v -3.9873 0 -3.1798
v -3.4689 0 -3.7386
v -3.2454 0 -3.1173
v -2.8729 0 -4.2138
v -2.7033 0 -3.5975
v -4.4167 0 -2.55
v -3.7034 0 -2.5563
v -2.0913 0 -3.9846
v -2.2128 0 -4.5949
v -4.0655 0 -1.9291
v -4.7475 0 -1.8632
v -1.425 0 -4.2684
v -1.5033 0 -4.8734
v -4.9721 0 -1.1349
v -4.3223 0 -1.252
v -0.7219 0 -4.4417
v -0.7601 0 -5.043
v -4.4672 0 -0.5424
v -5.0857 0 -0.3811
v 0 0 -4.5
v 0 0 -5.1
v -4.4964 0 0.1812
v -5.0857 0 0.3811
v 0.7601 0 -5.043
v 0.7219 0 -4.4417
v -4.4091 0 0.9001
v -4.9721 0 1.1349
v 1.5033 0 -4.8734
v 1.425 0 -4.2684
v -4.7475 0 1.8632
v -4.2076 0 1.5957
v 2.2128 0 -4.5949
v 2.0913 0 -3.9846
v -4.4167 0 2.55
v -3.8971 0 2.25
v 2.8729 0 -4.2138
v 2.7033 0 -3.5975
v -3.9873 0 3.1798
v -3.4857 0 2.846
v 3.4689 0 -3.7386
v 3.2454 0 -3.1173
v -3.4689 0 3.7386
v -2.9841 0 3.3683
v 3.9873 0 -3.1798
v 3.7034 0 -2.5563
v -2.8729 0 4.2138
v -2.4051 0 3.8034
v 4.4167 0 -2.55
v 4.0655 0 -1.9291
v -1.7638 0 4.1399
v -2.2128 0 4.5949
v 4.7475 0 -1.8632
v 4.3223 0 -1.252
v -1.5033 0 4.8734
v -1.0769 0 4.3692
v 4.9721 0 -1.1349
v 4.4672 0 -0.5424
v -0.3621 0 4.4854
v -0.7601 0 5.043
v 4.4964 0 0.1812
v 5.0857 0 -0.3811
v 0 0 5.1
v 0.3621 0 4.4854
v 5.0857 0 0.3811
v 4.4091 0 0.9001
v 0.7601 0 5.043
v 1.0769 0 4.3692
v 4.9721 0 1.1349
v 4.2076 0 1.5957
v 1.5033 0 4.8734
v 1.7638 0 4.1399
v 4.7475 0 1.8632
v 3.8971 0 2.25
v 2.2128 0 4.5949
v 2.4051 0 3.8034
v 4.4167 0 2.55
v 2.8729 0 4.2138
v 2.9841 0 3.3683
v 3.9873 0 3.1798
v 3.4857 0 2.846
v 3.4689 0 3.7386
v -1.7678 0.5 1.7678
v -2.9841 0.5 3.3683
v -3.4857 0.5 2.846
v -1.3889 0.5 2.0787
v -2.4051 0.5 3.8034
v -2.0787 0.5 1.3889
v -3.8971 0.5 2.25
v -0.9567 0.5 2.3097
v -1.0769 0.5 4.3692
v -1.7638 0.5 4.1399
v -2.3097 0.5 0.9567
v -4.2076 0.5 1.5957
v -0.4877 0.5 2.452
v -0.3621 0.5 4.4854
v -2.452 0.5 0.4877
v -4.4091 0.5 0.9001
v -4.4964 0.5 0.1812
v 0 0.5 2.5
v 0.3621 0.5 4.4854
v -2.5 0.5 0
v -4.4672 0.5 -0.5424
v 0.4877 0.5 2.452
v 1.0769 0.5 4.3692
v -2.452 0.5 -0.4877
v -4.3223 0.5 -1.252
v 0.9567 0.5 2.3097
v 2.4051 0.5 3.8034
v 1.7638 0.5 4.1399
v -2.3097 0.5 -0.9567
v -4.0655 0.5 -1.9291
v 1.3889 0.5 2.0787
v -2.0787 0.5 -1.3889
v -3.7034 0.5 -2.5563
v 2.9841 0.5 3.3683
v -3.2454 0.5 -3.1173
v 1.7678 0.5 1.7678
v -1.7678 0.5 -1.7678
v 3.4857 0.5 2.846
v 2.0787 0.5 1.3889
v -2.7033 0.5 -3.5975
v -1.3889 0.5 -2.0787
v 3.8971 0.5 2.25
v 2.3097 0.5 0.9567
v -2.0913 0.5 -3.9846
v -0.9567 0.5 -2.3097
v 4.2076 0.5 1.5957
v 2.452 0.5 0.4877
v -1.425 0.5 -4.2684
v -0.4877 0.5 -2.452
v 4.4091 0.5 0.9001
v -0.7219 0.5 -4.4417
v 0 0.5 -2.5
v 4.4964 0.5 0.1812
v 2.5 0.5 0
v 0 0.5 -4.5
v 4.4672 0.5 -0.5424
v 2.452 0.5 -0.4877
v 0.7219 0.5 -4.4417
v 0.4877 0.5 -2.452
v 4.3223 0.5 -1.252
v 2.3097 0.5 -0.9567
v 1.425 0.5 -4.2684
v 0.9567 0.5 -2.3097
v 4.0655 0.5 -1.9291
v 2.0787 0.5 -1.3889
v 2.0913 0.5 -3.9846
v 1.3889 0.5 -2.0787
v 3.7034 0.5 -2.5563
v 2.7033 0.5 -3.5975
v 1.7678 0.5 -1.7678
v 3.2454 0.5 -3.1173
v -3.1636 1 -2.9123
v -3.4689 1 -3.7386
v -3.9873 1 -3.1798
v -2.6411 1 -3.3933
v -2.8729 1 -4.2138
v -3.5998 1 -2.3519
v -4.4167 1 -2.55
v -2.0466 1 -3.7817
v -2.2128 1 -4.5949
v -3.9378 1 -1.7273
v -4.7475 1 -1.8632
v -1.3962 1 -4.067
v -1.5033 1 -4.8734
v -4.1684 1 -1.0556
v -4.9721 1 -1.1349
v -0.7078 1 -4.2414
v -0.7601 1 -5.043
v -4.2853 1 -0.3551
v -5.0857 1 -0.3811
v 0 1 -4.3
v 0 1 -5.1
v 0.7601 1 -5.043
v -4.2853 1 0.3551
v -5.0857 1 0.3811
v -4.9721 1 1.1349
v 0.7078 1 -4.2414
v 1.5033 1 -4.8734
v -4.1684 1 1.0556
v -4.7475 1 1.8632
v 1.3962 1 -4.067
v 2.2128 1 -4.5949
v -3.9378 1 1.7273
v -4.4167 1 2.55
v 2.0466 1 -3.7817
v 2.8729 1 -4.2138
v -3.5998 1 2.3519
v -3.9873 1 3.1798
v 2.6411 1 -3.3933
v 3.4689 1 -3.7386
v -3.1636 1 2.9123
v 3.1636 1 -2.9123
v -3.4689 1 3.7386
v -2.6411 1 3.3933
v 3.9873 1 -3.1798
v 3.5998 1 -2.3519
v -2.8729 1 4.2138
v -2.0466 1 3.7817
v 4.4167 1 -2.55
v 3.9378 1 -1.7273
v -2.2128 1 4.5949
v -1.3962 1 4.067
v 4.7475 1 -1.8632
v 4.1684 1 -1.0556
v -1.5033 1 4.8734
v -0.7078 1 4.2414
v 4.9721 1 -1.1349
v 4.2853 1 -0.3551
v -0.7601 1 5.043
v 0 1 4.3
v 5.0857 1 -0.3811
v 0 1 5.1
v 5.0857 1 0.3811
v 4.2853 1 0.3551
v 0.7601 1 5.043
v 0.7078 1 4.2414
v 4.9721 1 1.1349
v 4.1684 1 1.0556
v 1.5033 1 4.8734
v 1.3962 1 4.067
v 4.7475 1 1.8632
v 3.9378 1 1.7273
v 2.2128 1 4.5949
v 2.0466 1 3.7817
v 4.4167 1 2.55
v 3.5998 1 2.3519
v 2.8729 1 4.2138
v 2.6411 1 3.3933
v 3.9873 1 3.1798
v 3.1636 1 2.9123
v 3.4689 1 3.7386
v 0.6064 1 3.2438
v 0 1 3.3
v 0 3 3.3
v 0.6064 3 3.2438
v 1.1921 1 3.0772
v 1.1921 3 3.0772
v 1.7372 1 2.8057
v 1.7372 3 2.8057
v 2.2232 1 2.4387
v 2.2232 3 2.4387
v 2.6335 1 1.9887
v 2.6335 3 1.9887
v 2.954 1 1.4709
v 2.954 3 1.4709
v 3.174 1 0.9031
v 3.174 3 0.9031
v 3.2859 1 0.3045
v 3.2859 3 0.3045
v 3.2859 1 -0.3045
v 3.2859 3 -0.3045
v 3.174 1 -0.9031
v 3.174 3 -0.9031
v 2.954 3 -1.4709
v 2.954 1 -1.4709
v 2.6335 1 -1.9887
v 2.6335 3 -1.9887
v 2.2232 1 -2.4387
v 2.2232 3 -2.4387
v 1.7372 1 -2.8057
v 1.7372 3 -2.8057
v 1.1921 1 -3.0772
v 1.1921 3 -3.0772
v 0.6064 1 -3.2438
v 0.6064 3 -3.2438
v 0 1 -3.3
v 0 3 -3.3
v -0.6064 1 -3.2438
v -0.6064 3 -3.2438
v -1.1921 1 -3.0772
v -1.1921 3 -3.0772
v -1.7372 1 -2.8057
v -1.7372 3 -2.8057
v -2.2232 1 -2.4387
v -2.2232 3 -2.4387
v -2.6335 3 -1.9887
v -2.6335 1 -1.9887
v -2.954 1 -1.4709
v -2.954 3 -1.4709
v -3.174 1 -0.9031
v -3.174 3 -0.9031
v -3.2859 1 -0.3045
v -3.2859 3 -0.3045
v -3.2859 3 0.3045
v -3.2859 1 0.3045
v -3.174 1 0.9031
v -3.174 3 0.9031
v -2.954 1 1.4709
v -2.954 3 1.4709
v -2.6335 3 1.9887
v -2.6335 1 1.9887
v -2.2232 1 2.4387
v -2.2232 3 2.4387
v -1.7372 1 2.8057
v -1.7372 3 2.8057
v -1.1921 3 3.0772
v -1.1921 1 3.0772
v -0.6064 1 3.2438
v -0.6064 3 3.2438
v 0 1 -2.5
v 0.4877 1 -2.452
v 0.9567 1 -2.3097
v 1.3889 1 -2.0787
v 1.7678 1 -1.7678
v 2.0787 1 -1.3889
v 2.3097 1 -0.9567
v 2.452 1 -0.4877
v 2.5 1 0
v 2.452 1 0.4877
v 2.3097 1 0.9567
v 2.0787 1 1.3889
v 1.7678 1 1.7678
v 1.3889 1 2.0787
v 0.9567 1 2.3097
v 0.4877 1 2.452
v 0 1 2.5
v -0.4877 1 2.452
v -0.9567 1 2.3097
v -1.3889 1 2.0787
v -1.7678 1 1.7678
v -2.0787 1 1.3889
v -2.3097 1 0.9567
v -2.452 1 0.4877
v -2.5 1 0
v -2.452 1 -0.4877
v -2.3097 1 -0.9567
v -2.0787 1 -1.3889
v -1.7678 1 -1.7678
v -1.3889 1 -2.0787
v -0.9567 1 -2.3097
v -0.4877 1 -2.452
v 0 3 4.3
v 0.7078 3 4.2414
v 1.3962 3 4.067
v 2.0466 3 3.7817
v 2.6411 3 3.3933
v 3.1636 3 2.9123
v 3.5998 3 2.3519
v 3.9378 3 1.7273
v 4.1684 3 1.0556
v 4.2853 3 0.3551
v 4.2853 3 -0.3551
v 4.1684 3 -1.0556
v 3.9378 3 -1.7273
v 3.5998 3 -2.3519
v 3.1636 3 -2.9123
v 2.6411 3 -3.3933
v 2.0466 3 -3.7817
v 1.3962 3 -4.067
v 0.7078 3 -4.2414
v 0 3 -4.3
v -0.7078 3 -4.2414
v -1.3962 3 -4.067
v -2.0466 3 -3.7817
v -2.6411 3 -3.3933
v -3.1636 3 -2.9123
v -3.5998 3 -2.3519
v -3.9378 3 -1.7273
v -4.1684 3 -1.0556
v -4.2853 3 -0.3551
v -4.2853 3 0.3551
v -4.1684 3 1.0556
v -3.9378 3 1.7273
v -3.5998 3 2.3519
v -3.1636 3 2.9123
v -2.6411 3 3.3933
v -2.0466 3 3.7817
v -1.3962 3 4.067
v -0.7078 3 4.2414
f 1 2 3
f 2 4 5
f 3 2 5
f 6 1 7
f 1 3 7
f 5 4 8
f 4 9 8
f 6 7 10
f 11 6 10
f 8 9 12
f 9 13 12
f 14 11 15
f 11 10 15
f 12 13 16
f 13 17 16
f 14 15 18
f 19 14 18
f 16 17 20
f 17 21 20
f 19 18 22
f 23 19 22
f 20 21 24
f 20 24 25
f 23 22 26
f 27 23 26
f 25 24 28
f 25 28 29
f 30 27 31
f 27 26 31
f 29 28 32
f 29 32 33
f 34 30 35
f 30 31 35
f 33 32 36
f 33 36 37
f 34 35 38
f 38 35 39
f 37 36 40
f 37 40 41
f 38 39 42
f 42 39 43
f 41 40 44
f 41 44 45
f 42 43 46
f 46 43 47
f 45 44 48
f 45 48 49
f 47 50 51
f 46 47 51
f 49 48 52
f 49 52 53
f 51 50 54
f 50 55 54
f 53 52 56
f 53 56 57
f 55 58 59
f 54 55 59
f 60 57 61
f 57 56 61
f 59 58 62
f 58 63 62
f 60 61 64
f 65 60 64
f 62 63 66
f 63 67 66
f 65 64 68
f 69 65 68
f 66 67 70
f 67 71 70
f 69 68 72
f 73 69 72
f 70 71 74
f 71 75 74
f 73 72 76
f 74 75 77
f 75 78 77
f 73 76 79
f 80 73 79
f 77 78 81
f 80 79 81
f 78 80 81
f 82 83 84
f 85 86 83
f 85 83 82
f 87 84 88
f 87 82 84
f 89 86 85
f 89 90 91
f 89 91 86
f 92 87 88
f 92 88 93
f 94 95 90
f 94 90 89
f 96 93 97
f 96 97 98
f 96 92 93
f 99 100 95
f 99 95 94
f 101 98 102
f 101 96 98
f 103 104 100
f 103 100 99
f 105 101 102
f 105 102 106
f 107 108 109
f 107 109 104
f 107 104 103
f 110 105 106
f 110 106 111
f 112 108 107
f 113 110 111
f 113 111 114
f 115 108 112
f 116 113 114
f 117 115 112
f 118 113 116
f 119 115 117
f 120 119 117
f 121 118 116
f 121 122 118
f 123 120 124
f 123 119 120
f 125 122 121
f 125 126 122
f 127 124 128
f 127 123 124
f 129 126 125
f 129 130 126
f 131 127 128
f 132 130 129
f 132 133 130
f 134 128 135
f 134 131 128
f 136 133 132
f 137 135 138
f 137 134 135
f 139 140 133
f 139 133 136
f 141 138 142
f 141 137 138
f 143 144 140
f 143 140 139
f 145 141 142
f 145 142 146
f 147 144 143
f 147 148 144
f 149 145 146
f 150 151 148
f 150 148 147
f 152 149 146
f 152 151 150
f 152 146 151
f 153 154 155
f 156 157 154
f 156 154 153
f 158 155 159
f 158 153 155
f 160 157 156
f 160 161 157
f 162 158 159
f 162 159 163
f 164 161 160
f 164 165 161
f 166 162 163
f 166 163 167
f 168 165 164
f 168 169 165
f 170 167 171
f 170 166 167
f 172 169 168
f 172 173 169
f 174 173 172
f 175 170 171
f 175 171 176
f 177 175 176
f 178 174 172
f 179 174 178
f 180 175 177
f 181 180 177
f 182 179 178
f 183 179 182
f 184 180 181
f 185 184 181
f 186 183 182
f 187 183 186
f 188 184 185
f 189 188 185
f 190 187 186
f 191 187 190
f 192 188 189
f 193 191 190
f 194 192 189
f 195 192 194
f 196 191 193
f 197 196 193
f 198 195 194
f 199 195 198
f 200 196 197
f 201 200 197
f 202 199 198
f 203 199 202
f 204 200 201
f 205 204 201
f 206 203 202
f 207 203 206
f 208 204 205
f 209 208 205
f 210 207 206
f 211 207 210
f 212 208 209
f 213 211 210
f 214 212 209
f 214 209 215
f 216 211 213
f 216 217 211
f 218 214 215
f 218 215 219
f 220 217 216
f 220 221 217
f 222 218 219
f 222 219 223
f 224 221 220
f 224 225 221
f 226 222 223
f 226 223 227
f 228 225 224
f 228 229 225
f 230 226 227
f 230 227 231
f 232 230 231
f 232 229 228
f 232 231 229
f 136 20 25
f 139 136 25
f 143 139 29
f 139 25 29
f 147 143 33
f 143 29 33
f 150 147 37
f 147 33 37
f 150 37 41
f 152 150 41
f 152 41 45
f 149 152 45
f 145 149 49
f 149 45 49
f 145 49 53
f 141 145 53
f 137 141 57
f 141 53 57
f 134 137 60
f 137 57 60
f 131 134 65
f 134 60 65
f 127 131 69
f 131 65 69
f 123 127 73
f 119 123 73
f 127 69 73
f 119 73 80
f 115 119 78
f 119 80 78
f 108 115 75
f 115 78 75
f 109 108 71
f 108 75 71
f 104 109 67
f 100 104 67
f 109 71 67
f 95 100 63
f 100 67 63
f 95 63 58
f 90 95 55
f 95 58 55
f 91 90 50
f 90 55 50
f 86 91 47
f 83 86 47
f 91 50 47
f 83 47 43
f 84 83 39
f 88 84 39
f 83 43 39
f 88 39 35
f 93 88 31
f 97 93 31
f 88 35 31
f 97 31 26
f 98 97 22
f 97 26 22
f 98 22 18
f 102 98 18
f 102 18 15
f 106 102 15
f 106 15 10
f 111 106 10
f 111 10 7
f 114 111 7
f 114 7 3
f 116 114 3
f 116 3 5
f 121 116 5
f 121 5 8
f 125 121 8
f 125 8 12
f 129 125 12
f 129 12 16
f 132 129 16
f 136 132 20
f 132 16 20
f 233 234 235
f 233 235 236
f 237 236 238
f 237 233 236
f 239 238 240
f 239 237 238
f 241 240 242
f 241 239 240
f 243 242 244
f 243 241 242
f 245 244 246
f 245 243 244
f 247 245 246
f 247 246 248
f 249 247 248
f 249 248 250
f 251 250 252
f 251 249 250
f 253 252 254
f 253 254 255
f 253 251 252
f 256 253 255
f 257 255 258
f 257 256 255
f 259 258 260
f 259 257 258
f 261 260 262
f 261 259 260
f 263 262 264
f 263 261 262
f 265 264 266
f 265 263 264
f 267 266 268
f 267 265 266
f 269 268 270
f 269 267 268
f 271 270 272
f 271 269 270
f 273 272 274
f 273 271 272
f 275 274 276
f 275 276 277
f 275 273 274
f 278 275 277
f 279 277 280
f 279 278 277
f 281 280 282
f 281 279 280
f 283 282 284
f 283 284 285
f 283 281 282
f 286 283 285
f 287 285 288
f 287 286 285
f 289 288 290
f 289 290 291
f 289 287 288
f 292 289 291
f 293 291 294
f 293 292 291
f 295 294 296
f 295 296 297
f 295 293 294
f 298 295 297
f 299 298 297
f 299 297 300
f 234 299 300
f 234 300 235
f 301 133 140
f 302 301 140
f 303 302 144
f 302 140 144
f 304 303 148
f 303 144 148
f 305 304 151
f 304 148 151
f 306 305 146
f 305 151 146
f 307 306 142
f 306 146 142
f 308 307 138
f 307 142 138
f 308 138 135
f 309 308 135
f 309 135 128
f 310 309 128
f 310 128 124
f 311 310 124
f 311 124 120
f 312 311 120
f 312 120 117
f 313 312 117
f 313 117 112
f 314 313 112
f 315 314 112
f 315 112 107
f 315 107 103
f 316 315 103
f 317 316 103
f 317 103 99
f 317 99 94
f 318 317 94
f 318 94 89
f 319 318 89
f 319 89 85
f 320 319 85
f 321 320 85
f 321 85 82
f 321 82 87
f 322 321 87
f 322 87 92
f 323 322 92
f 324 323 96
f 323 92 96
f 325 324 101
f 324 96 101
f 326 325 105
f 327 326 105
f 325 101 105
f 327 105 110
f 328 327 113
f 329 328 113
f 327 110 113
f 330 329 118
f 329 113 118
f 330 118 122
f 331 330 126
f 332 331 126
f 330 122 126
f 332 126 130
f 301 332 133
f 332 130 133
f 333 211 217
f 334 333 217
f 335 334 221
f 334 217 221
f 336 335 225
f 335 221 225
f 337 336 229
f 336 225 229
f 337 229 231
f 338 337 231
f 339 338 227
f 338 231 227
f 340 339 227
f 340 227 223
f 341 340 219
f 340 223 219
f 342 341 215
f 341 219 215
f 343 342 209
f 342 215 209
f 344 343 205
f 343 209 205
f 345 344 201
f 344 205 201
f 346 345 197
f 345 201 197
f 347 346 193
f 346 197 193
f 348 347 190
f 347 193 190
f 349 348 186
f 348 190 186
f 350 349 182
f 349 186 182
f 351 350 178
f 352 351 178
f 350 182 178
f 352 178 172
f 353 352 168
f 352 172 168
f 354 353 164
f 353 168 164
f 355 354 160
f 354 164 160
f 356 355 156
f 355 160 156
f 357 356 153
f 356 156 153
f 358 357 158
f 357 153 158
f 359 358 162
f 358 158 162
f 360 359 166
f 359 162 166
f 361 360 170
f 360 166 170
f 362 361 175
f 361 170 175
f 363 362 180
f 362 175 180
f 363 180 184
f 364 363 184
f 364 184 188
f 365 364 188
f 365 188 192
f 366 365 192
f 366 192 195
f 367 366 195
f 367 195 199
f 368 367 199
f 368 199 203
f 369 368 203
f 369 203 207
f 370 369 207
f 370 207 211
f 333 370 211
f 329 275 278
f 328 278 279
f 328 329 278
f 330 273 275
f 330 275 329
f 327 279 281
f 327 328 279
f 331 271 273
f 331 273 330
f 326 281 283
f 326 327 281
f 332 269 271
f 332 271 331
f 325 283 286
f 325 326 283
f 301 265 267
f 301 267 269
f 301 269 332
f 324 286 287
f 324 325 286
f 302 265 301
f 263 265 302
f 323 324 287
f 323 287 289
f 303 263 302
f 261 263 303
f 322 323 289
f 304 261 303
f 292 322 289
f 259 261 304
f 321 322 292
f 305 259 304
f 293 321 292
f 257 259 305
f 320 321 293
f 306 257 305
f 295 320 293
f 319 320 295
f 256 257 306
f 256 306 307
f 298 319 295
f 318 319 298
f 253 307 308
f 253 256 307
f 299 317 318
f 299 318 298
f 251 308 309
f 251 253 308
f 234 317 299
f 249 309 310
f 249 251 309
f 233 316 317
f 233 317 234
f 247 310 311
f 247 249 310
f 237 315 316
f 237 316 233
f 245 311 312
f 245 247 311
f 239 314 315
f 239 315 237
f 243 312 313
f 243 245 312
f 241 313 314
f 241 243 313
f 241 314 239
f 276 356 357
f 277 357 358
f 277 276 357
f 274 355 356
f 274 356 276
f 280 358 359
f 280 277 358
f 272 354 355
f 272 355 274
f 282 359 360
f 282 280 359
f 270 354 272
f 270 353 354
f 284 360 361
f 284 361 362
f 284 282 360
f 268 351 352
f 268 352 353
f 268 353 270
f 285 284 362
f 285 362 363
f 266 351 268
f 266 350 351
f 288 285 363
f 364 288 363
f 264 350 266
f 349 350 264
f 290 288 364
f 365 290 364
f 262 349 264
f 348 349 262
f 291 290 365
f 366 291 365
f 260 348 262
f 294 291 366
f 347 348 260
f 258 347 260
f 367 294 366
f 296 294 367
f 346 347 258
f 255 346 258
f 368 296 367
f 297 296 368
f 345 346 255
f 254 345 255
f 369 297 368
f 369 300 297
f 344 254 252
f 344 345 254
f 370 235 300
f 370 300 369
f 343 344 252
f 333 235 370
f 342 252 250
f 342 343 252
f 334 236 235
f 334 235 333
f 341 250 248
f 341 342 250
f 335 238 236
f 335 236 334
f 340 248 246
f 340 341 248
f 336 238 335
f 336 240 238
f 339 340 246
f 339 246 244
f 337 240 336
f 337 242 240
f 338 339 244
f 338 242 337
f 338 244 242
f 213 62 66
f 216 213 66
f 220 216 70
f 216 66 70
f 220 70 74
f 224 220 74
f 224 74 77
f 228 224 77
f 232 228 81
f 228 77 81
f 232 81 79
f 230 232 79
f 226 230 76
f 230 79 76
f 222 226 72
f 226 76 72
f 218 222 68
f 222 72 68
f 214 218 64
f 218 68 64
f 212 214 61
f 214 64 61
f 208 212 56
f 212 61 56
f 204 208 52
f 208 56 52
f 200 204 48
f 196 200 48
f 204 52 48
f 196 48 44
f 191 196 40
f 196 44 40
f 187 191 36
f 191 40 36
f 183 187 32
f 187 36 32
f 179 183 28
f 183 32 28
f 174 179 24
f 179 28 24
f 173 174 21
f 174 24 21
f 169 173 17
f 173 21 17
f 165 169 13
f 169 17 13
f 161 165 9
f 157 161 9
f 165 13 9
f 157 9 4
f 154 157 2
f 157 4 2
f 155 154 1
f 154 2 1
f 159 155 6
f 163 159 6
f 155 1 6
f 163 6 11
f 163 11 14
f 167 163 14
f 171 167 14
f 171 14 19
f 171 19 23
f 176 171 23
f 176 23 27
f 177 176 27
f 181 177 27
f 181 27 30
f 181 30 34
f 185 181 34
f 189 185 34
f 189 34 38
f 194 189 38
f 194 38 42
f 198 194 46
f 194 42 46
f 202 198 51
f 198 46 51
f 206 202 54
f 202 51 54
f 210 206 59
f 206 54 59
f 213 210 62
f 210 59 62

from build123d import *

# Parameters (mm, degrees)
SKETCH1_R           = 5.1
BOSS_EXTRUDE1_DEPTH = 1
SKETCH2_R           = 4.3
SKETCH2_R_2         = 3.3
BOSS_EXTRUDE2_DEPTH = 2
SKETCH3_R           = 2.5
CUT_EXTRUDE1_DEPTH  = 2
SKETCH4_R           = 4.5
CUT_EXTRUDE2_DEPTH  = 0.5


with BuildPart() as part:
    # Sketch1 → Boss-Extrude1 (new body)
    with BuildSketch(Plane(origin=(0, 0, 0), x_dir=(1, 0, 0), z_dir=(0, 1, 0))):
        with Locations(Location((0, 0, 0), (0, 0, 270))):
            Circle(SKETCH1_R)
    extrude(amount=BOSS_EXTRUDE1_DEPTH)

    # Sketch2 → Boss-Extrude2 (add)
    with BuildSketch(Plane(origin=(0, 1, 0), x_dir=(1, 0, 0), z_dir=(0, 1, 0))):
        with Locations(Location((0, 0, 0), (0, 0, 270))):
            Circle(SKETCH2_R)
        with Locations(Location((0, 0, 0), (0, 0, 270))):
            Circle(SKETCH2_R_2, mode=Mode.SUBTRACT)
    extrude(amount=BOSS_EXTRUDE2_DEPTH)

    # Sketch3 → Cut-Extrude1 (cut)
    with BuildSketch(Plane.XZ):
        with Locations(Location((0, 0, 0), (0, 0, 270))):
            Circle(SKETCH3_R)
    extrude(amount=-CUT_EXTRUDE1_DEPTH, mode=Mode.SUBTRACT)

    # Sketch4 → Cut-Extrude2 (cut)
    with BuildSketch(Plane.XZ):
        with Locations(Location((0, 0, 0), (0, 0, 270))):
            Circle(SKETCH4_R)
    extrude(amount=-CUT_EXTRUDE2_DEPTH, mode=Mode.SUBTRACT)


solid = part.part
